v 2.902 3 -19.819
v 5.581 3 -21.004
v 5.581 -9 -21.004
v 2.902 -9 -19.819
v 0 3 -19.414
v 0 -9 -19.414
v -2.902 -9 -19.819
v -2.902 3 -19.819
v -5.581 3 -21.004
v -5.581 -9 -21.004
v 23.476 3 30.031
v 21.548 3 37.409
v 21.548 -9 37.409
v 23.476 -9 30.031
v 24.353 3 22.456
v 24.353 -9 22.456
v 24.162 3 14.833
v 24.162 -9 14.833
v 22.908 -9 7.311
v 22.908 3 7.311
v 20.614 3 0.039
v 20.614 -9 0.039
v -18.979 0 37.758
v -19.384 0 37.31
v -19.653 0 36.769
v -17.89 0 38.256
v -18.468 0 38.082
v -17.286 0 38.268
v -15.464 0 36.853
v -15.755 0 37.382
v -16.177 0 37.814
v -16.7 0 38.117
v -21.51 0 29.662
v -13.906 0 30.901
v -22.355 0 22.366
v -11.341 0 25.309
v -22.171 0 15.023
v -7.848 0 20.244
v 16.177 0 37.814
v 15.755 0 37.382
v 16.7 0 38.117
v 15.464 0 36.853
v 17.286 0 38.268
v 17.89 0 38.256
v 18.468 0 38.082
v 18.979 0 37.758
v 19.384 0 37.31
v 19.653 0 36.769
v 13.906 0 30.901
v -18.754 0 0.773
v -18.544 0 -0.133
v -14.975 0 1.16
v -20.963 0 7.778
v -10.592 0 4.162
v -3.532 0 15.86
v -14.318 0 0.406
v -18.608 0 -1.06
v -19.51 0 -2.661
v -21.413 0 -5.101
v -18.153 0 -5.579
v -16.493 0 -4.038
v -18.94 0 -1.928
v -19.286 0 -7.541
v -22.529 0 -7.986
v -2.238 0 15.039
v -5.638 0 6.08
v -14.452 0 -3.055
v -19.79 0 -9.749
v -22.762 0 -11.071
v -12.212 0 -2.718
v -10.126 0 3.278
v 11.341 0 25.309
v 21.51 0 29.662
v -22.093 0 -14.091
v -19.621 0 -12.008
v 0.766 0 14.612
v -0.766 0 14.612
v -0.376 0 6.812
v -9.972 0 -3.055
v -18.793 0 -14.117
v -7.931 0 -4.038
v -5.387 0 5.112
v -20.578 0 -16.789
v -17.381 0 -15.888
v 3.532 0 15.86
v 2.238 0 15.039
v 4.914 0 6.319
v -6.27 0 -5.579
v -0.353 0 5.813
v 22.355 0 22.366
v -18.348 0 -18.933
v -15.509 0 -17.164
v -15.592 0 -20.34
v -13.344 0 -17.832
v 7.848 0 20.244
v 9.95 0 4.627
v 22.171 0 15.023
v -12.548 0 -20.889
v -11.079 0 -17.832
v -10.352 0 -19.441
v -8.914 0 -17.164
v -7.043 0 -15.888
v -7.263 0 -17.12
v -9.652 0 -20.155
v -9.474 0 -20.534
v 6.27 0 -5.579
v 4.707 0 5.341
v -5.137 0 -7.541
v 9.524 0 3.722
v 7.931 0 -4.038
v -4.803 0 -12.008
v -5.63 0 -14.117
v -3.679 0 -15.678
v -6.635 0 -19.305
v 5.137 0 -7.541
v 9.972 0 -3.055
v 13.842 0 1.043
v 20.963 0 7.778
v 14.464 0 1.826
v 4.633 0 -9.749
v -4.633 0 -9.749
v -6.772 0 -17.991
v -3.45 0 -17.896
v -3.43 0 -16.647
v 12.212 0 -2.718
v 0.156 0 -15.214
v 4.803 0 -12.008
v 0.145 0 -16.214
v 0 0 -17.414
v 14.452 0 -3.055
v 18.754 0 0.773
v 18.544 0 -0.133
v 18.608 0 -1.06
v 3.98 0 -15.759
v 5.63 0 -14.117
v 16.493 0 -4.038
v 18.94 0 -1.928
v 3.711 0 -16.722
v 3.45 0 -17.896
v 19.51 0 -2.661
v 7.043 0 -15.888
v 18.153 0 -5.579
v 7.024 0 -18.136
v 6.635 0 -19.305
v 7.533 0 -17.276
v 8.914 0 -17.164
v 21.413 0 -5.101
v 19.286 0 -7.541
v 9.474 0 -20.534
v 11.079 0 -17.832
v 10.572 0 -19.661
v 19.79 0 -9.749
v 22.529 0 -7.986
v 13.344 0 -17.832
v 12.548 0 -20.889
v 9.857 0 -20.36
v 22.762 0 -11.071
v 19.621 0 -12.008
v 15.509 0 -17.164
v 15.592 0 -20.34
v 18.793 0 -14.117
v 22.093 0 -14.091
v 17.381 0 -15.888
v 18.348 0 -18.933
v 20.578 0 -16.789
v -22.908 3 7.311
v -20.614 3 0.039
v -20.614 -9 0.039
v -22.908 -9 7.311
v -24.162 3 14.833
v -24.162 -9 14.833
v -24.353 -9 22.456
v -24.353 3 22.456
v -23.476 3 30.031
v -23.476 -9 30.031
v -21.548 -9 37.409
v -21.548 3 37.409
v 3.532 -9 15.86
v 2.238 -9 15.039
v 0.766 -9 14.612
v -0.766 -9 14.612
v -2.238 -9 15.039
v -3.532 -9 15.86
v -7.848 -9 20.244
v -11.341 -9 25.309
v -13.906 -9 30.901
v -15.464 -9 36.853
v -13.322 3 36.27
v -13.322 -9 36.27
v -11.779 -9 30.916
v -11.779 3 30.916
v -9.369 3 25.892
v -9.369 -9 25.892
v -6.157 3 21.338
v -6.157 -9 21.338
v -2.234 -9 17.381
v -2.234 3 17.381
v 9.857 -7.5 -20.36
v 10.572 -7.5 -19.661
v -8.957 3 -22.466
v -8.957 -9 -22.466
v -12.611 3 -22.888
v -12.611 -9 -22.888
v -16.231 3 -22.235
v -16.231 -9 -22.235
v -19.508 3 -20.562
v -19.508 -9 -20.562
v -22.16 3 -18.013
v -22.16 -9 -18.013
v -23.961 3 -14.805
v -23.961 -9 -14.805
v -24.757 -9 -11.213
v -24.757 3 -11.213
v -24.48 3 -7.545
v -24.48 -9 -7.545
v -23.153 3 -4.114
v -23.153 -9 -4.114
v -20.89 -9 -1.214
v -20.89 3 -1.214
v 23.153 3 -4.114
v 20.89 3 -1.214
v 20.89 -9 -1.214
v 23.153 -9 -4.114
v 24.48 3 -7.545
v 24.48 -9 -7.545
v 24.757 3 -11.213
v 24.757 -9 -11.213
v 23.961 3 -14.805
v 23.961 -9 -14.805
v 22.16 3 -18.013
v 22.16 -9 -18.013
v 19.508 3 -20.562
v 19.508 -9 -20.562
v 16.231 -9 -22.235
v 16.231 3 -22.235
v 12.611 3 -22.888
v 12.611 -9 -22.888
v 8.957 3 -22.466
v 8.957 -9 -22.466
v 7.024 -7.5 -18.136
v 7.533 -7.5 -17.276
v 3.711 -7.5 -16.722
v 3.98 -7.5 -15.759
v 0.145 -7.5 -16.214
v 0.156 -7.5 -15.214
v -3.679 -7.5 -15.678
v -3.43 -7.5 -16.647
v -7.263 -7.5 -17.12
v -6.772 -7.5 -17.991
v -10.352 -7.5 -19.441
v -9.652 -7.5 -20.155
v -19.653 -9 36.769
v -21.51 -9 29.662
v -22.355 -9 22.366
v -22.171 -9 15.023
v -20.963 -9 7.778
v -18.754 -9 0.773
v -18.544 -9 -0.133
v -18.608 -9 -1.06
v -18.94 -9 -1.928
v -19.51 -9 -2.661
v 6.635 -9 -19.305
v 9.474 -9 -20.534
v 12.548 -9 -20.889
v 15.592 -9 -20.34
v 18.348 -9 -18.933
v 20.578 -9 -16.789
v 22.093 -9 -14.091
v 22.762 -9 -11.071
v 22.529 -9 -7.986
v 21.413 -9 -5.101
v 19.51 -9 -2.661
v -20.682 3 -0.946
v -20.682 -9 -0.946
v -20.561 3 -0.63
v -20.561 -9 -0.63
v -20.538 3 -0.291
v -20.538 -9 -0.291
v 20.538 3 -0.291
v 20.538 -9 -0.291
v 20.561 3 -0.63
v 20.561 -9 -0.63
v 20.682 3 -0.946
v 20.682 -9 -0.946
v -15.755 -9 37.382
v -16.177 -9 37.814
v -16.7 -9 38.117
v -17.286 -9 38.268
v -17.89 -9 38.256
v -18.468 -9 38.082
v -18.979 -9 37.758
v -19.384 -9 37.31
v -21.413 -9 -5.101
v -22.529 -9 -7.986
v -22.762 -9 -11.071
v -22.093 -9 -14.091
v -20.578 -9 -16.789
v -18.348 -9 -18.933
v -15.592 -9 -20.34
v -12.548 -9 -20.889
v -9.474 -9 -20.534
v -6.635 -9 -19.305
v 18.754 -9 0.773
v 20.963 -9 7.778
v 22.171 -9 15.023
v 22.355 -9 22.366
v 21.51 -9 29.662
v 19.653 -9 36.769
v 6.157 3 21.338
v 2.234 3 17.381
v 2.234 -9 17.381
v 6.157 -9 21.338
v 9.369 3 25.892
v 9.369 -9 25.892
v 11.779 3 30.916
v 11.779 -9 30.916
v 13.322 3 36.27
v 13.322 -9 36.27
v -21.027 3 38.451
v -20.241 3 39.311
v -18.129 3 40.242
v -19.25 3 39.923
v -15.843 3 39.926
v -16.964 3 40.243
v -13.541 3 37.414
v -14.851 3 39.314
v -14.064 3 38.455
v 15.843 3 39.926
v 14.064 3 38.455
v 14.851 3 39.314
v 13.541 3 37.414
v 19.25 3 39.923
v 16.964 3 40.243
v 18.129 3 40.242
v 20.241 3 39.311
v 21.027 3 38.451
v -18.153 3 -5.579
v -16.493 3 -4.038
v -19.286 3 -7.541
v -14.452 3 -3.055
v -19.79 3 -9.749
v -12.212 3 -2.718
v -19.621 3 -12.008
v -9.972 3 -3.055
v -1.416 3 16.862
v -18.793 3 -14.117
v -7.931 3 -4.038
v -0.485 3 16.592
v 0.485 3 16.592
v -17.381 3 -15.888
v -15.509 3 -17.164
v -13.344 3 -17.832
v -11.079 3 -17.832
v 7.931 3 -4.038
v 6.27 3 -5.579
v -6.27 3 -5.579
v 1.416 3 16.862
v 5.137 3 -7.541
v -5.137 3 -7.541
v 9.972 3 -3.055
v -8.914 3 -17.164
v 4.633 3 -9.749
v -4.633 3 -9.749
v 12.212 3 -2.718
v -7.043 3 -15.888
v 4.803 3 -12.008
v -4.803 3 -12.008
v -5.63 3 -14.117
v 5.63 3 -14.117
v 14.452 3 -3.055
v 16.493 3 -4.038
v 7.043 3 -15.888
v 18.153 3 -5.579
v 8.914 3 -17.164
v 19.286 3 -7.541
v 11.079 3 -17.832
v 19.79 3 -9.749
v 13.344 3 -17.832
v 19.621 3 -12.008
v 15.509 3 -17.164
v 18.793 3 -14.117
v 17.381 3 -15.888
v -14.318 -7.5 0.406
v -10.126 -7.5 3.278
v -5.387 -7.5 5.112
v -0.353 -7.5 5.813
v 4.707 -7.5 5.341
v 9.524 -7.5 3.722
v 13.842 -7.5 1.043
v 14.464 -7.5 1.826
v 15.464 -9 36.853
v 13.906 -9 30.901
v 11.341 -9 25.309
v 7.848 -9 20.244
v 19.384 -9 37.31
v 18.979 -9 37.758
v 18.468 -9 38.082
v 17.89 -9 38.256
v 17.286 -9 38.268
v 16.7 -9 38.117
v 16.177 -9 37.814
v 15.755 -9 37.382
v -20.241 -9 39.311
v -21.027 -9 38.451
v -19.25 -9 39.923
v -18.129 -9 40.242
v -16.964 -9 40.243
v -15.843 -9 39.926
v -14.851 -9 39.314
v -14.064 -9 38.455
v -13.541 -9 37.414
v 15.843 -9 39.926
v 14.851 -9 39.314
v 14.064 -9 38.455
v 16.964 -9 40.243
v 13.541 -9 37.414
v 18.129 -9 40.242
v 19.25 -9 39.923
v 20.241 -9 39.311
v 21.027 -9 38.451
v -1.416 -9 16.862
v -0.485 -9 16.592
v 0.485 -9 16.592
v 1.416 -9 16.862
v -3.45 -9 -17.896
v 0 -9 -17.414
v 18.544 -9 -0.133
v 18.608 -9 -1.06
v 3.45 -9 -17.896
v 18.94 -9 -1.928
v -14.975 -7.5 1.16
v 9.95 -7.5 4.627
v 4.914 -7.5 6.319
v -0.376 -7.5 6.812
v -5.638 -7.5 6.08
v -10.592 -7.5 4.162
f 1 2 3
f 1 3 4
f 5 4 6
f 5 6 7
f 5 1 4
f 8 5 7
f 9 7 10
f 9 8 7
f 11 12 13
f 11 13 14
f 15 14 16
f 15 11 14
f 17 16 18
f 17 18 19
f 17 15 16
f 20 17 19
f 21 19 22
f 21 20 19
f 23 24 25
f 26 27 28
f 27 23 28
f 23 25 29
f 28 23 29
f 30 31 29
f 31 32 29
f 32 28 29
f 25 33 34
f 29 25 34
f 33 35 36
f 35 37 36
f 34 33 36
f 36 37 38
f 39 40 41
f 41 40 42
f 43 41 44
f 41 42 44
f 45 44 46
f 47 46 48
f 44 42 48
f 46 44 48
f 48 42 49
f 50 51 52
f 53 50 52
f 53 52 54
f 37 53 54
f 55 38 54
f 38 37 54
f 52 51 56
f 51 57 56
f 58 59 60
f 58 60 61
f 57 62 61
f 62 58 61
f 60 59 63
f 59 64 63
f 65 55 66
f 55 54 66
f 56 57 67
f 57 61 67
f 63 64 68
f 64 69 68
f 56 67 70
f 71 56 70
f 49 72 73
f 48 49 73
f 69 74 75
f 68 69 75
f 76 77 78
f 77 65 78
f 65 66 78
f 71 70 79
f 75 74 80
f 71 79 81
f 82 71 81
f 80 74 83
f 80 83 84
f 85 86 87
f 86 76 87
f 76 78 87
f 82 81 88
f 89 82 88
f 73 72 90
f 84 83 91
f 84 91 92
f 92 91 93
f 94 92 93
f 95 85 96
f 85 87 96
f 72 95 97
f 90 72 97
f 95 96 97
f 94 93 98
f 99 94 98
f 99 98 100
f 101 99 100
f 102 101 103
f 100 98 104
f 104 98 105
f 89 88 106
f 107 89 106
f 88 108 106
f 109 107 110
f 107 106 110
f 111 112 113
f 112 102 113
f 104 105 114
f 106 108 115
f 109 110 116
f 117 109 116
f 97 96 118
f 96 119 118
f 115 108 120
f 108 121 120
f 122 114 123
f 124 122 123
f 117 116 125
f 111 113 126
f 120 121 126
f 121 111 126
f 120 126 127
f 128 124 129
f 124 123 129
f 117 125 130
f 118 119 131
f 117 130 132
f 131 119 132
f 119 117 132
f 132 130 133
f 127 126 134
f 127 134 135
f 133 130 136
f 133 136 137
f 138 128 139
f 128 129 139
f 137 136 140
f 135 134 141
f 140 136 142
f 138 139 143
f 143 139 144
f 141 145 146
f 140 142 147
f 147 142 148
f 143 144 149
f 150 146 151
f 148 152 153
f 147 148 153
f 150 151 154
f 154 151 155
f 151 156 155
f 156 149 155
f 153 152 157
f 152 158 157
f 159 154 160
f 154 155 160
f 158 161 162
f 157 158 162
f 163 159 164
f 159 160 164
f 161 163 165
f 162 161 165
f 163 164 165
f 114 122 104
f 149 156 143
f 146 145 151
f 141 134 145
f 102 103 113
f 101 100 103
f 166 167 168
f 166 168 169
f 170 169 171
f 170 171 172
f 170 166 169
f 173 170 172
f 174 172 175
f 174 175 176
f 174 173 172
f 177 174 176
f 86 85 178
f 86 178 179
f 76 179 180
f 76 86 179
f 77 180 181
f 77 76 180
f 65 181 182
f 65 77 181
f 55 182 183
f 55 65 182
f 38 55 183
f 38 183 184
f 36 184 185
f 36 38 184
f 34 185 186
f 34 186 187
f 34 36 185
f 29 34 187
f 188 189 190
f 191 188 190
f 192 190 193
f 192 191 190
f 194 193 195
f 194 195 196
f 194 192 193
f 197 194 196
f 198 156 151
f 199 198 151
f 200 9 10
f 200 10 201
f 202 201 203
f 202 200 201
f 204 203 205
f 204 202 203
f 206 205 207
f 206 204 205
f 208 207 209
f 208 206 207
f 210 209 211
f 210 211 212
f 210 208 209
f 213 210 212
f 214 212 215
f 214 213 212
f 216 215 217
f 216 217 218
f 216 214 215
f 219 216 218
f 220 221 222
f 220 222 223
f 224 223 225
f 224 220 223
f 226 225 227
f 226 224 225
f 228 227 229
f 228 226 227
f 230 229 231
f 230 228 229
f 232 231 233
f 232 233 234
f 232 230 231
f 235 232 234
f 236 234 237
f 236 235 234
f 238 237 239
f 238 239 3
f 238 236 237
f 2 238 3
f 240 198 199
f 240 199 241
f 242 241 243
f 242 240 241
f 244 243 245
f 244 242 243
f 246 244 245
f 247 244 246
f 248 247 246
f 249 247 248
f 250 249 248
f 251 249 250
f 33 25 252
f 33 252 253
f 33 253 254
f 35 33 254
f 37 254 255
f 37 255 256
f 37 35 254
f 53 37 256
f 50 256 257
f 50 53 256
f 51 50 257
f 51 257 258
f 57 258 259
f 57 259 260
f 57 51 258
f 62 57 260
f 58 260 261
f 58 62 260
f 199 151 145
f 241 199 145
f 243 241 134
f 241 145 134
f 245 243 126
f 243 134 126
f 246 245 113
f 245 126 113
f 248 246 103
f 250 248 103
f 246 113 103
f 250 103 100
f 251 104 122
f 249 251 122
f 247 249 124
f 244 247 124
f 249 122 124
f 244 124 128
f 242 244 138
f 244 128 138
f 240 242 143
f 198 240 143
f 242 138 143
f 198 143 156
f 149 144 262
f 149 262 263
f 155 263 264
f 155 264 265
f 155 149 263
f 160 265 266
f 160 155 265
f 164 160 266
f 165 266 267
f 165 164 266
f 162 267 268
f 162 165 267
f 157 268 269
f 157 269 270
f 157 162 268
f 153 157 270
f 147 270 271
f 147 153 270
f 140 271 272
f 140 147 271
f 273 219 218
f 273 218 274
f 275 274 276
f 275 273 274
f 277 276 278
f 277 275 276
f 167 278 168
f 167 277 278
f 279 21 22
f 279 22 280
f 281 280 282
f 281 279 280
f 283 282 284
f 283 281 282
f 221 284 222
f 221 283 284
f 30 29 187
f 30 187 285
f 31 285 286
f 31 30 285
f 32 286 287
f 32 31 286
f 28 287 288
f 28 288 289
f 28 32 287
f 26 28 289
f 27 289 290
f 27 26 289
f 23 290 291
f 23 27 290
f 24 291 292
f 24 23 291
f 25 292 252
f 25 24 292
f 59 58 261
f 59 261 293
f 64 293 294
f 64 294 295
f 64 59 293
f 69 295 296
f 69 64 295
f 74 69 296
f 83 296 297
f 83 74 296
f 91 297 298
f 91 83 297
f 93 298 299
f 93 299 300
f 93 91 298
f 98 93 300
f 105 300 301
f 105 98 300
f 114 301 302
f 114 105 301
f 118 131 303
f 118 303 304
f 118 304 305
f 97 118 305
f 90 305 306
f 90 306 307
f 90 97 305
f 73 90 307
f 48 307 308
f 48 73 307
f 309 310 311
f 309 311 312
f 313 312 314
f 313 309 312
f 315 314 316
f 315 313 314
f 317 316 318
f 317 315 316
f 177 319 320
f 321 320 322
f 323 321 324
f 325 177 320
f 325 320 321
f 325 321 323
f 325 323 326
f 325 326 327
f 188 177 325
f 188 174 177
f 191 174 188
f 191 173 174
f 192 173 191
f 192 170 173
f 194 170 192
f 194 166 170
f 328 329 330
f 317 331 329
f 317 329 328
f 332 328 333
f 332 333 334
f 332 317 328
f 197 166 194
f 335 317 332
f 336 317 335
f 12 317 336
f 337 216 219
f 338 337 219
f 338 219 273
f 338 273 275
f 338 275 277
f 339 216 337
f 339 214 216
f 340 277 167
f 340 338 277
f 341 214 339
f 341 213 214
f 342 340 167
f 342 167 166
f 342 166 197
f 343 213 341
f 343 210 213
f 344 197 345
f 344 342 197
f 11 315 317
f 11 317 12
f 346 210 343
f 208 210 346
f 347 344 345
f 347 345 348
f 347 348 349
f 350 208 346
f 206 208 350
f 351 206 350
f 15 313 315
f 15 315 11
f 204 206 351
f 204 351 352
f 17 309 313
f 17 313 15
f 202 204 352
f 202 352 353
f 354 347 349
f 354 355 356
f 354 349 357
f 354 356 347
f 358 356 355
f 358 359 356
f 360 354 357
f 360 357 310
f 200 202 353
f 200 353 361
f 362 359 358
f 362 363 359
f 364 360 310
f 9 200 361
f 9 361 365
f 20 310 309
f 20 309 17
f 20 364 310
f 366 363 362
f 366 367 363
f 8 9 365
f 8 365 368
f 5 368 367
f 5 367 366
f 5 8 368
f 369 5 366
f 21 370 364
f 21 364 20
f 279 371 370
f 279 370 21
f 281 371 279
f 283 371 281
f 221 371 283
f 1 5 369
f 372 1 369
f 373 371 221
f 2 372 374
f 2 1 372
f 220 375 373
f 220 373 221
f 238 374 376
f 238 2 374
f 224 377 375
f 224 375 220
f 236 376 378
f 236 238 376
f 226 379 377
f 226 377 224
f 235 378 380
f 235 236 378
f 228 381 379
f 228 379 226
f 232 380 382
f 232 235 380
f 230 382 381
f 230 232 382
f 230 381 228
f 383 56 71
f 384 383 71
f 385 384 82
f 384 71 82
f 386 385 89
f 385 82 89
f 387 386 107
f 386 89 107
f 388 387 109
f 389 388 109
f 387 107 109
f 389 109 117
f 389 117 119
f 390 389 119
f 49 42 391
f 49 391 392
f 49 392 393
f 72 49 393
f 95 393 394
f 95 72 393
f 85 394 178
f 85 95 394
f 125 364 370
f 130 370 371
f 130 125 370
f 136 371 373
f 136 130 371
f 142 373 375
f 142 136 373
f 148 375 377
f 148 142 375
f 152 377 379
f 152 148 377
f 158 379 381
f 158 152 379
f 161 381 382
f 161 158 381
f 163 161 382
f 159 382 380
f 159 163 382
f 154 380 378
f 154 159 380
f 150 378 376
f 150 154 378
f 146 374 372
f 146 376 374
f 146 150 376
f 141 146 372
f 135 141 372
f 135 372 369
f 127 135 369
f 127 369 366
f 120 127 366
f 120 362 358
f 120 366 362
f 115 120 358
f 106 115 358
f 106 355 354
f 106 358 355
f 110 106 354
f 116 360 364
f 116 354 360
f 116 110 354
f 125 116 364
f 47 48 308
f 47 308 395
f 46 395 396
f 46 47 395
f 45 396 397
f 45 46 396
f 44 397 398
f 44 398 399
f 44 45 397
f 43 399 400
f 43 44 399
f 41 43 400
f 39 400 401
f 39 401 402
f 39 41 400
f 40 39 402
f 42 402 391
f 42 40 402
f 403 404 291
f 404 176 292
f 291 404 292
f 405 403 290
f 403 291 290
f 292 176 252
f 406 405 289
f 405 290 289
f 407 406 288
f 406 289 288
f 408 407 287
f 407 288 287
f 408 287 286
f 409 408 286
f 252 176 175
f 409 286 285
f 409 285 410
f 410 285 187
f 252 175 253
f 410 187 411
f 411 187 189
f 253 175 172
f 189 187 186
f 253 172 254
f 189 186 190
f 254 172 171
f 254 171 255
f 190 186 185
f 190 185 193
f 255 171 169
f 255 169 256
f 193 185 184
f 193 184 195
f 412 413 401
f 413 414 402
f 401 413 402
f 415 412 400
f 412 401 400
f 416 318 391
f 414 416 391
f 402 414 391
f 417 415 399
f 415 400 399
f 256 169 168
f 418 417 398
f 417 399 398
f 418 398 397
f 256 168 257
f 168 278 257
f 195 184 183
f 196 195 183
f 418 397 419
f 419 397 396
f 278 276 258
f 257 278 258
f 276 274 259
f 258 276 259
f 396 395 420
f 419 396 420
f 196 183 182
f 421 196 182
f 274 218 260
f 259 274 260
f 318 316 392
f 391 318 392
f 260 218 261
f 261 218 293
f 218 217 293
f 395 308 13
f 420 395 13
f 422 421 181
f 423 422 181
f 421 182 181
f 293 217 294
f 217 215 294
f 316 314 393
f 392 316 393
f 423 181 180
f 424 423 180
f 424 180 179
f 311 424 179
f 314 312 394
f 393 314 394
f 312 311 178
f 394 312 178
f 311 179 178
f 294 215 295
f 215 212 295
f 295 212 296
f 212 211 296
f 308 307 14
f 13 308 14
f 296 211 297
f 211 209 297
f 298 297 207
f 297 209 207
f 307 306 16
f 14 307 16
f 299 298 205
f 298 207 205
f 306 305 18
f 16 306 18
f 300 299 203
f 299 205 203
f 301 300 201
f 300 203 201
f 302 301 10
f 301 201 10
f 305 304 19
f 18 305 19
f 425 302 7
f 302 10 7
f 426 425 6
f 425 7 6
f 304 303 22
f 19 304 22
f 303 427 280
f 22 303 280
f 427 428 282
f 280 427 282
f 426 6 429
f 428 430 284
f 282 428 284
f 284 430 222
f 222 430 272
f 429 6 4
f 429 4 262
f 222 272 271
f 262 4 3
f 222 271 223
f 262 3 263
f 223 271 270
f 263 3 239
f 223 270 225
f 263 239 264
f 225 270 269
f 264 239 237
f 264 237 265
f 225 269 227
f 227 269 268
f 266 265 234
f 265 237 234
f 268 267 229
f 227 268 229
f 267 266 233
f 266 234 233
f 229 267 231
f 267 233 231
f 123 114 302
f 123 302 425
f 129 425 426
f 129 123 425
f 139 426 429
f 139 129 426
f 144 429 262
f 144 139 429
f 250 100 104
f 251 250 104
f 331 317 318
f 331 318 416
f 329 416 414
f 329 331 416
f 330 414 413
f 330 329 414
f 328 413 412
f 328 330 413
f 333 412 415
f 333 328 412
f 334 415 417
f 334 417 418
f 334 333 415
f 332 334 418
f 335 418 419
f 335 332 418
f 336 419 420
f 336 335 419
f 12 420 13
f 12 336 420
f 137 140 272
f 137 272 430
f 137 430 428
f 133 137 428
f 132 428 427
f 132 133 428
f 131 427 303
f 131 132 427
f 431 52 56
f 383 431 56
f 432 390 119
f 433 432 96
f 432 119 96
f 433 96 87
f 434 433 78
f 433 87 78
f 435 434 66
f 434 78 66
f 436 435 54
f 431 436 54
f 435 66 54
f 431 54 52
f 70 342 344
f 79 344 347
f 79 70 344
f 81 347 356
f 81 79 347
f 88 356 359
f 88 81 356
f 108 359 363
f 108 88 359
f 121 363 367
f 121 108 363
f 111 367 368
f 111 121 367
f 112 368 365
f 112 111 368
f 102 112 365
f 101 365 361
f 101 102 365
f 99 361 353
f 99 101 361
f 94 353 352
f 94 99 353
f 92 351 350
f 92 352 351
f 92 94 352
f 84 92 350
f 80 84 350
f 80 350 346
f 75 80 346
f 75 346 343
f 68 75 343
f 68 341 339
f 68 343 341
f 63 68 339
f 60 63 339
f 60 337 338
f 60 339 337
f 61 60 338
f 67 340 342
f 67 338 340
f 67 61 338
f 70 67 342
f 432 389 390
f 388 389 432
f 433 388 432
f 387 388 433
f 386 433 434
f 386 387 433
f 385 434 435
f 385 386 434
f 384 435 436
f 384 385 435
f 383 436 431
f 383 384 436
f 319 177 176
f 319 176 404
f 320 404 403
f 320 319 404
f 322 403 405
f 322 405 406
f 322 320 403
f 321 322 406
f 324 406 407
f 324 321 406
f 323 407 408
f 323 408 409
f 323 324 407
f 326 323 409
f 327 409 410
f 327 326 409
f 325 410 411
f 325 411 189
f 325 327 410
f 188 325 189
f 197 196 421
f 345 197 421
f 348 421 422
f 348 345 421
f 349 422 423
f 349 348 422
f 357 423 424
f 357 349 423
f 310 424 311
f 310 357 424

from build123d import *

# Parameters (mm, degrees)
VYSUNOUT_TENKOST_NN_1_DEPTH   = 9
VYSUNOUT_TENKOST_NN_2_DEPTH   = 7.5
VYSUNOUT_TENKOST_NN_2_2_DEPTH = 7.5
P_IDAT_VYSUNUT_M2_DEPTH       = 3
VYSUNOUT_START                = 3
VYSUNOUT_TENKOST_NN_3_DEPTH   = 3
SKICA4_R                      = 7.599478253
ODEBRAT_VYSUNUT_M1_DEPTH      = 10


with BuildPart() as part:
    # Skica3 → Vysunout tenkostěnný1 (new body)
    with BuildSketch(Plane(origin=(0, 0, 0), x_dir=(1, 0, 0), z_dir=(0, 1, 0))):
        with BuildLine():
            ThreePointArc((13.318818193, -36.180678557), (16.919790609, -40.236611382), (21.547993361, -37.408655814))
            ThreePointArc((21.547993361, -37.408655814), (24.391270235, -18.641089057), (20.614348293, -0.038921281))
            ThreePointArc((20.614348293, -0.038921281), (20.561150024, 0.629518412), (20.890277717, 1.213741521))
            ThreePointArc((20.890277717, 1.213741521), (22.159844041, 18.012545588), (5.58094625, 21.004495587))
            ThreePointArc((5.58094625, 21.004495587), (0, 19.413874141), (-5.58094625, 21.004495587))
            ThreePointArc((-5.58094625, 21.004495587), (-22.159844041, 18.012545588), (-20.890277717, 1.213741521))
            ThreePointArc((-20.890277717, 1.213741521), (-20.561150024, 0.629518412), (-20.614348293, -0.038921281))
            ThreePointArc((-20.614348293, -0.038921281), (-24.391270235, -18.641089057), (-21.547993361, -37.408655814))
            ThreePointArc((-21.547993361, -37.408655814), (-16.919790609, -40.236611382), (-13.318818193, -36.180678557))
            Line((-13.318818193, -36.180678557), (-15.317951996, -36.121822462))
            ThreePointArc((-15.317951996, -36.121822462), (-17.214967104, -38.2585136), (-19.653133669, -36.768728669))
            ThreePointArc((-19.653133669, -36.768728669), (-22.391894143, -18.691041449), (-18.753808587, -0.772673285))
            ThreePointArc((-18.753808587, -0.772673285), (-18.607973584, 1.059752989), (-19.510227352, 2.661312241))
            ThreePointArc((-19.510227352, 2.661312241), (-20.577911445, 16.788826149), (-6.635335046, 19.305006173))
            ThreePointArc((-6.635335046, 19.305006173), (0, 17.413874141), (6.635335046, 19.305006173))
            ThreePointArc((6.635335046, 19.305006173), (20.577911445, 16.788826149), (19.510227352, 2.661312241))
            ThreePointArc((19.510227352, 2.661312241), (18.607973584, 1.059752989), (18.753808587, -0.772673285))
            ThreePointArc((18.753808587, -0.772673285), (22.391894143, -18.691041449), (19.653133669, -36.768728669))
            ThreePointArc((19.653133669, -36.768728669), (17.214967104, -38.2585136), (15.317951996, -36.121822462))
            Line((15.317951996, -36.121822462), (13.318818193, -36.180678557))
        make_face()
        with BuildLine():
            ThreePointArc((15.479480606, -36.942506696), (11.363736232, -25.348385806), (3.532419897, -15.859788681))
            ThreePointArc((3.532419897, -15.859788681), (0, -14.557634697), (-3.532419897, -15.859788681))
            ThreePointArc((-3.532419897, -15.859788681), (-11.363736232, -25.348385806), (-15.479480606, -36.942506696))
            Line((-15.479480606, -36.942506696), (-13.507192877, -37.274291437))
            ThreePointArc((-13.507192877, -37.274291437), (-9.623698487, -26.334422643), (-2.234300531, -17.38126366))
            ThreePointArc((-2.234300531, -17.38126366), (0, -16.557634697), (2.234300531, -17.38126366))
            ThreePointArc((2.234300531, -17.38126366), (9.623698487, -26.334422643), (13.507192877, -37.274291437))
            Line((13.507192877, -37.274291437), (15.479480606, -36.942506696))
        make_face()
    extrude(amount=-VYSUNOUT_TENKOST_NN_1_DEPTH)



with BuildPart() as body_2:
    # Skica3<3> → Vysunout tenkostěnný2 (new body)
    with BuildSketch(Plane(origin=(0, 0, 0), x_dir=(1, 0, 0), z_dir=(0, 1, 0))):
        with BuildLine():
            ThreePointArc((-9.651511204, 20.15475088), (0.145367606, 16.213794321), (9.85696713, 20.360456559))
            Line((9.85696713, 20.360456559), (10.571915059, 19.661278857))
            ThreePointArc((10.571915059, 19.661278857), (0.155911444, 15.213849909), (-10.351556954, 19.440652884))
            Line((-10.351556954, 19.440652884), (-9.651511204, 20.15475088))
        make_face()
    extrude(amount=-VYSUNOUT_TENKOST_NN_2_DEPTH)


with BuildPart() as body_3:
    # Skica3<3> → Vysunout tenkost_nn_2 2 (new body)
    with BuildSketch(Plane(origin=(0, 0, 0), x_dir=(1, 0, 0), z_dir=(0, 1, 0))):
        with BuildLine():
            ThreePointArc((-14.318385094, -0.405797283), (-0.353145852, -5.812609189), (13.842408307, -1.043147566))
            Line((13.842408307, -1.043147566), (14.464095548, -1.82641315))
            ThreePointArc((14.464095548, -1.82641315), (-0.375772598, -6.812353171), (-14.974872193, -1.160134535))
            Line((-14.974872193, -1.160134535), (-14.318385094, -0.405797283))
        make_face()
    extrude(amount=-VYSUNOUT_TENKOST_NN_2_2_DEPTH)


with BuildPart() as part_1:
    add(part.part)

    add(body_2.part)  # Přidat vysunutím2 merges body 2

    add(body_3.part)  # Přidat vysunutím2 merges body 3
    # Skica3<4> → Přidat vysunutím2 (add)
    with BuildSketch(Plane(origin=(0, 0, 0), x_dir=(1, 0, 0), z_dir=(0, 1, 0))):
        with BuildLine():
            ThreePointArc((6.108140648, 20.15475088), (0, 18.413874141), (-6.108140648, 20.15475088))
            ThreePointArc((-6.108140648, 20.15475088), (-21.368877743, 17.400685868), (-20.200252534, 1.937526881))
            ThreePointArc((-20.200252534, 1.937526881), (-19.584561804, 0.844635701), (-19.68407844, -0.405797283))
            ThreePointArc((-19.68407844, -0.405797283), (-23.391582189, -18.666065253), (-20.600563515, -37.088692241))
            ThreePointArc((-20.600563515, -37.088692241), (-17.553998549, -39.282880534), (-14.493336742, -37.108399066))
            ThreePointArc((-14.493336742, -37.108399066), (-10.493717359, -25.841404225), (-2.883360214, -16.620526171))
            ThreePointArc((-2.883360214, -16.620526171), (0, -15.557634697), (2.883360214, -16.620526171))
            ThreePointArc((2.883360214, -16.620526171), (10.493717359, -25.841404225), (14.493336742, -37.108399066))
            ThreePointArc((14.493336742, -37.108399066), (17.553998549, -39.282880534), (20.600563515, -37.088692241))
            ThreePointArc((20.600563515, -37.088692241), (23.391582189, -18.666065253), (19.68407844, -0.405797283))
            ThreePointArc((19.68407844, -0.405797283), (19.584561804, 0.844635701), (20.200252534, 1.937526881))
            ThreePointArc((20.200252534, 1.937526881), (21.368877743, 17.400685868), (6.108140648, 20.15475088))
        make_face()
    extrude(amount=P_IDAT_VYSUNUT_M2_DEPTH)

    # Skica3<5> → Vysunout tenkostěnný3 (add)
    with BuildSketch(Plane(origin=(0, 0, 0), x_dir=(1, 0, 0), z_dir=(0, 1, 0)).offset(VYSUNOUT_START)):
        with BuildLine():
            ThreePointArc((13.318818193, -36.180678557), (16.919790609, -40.236611382), (21.547993361, -37.408655814))
            ThreePointArc((21.547993361, -37.408655814), (24.391270235, -18.641089057), (20.614348293, -0.038921281))
            ThreePointArc((20.614348293, -0.038921281), (20.561150024, 0.629518412), (20.890277717, 1.213741521))
            ThreePointArc((20.890277717, 1.213741521), (22.159844041, 18.012545588), (5.58094625, 21.004495587))
            ThreePointArc((5.58094625, 21.004495587), (0, 19.413874141), (-5.58094625, 21.004495587))
            ThreePointArc((-5.58094625, 21.004495587), (-22.159844041, 18.012545588), (-20.890277717, 1.213741521))
            ThreePointArc((-20.890277717, 1.213741521), (-20.561150024, 0.629518412), (-20.614348293, -0.038921281))
            ThreePointArc((-20.614348293, -0.038921281), (-24.391270235, -18.641089057), (-21.547993361, -37.408655814))
            ThreePointArc((-21.547993361, -37.408655814), (-16.919790609, -40.236611382), (-13.318818193, -36.180678557))
            Line((-13.318818193, -36.180678557), (-15.317951996, -36.121822462))
            ThreePointArc((-15.317951996, -36.121822462), (-17.214967104, -38.2585136), (-19.653133669, -36.768728669))
            ThreePointArc((-19.653133669, -36.768728669), (-22.391894143, -18.691041449), (-18.753808587, -0.772673285))
            ThreePointArc((-18.753808587, -0.772673285), (-18.607973584, 1.059752989), (-19.510227352, 2.661312241))
            ThreePointArc((-19.510227352, 2.661312241), (-20.577911445, 16.788826149), (-6.635335046, 19.305006173))
            ThreePointArc((-6.635335046, 19.305006173), (0, 17.413874141), (6.635335046, 19.305006173))
            ThreePointArc((6.635335046, 19.305006173), (20.577911445, 16.788826149), (19.510227352, 2.661312241))
            ThreePointArc((19.510227352, 2.661312241), (18.607973584, 1.059752989), (18.753808587, -0.772673285))
            ThreePointArc((18.753808587, -0.772673285), (22.391894143, -18.691041449), (19.653133669, -36.768728669))
            ThreePointArc((19.653133669, -36.768728669), (17.214967104, -38.2585136), (15.317951996, -36.121822462))
            Line((15.317951996, -36.121822462), (13.318818193, -36.180678557))
        make_face()
        with BuildLine():
            ThreePointArc((15.479480606, -36.942506696), (11.363736232, -25.348385806), (3.532419897, -15.859788681))
            ThreePointArc((3.532419897, -15.859788681), (0, -14.557634697), (-3.532419897, -15.859788681))
            ThreePointArc((-3.532419897, -15.859788681), (-11.363736232, -25.348385806), (-15.479480606, -36.942506696))
            Line((-15.479480606, -36.942506696), (-13.507192877, -37.274291437))
            ThreePointArc((-13.507192877, -37.274291437), (-9.623698487, -26.334422643), (-2.234300531, -17.38126366))
            ThreePointArc((-2.234300531, -17.38126366), (0, -16.557634697), (2.234300531, -17.38126366))
            ThreePointArc((2.234300531, -17.38126366), (9.623698487, -26.334422643), (13.507192877, -37.274291437))
            Line((13.507192877, -37.274291437), (15.479480606, -36.942506696))
        make_face()
        with BuildLine():
            ThreePointArc((-10.351556954, 19.440652884), (0.155911444, 15.213849909), (10.571915059, 19.661278857))
            Line((10.571915059, 19.661278857), (9.1420192, 21.05963426))
            ThreePointArc((9.1420192, 21.05963426), (0.134823768, 17.213738734), (-8.951465454, 20.868848876))
            Line((-8.951465454, 20.868848876), (-10.351556954, 19.440652884))
        make_face()
        with BuildLine():
            ThreePointArc((-14.974872193, -1.160134535), (-0.375772598, -6.812353171), (14.464095548, -1.82641315))
            Line((14.464095548, -1.82641315), (13.220721067, -0.259881982))
            ThreePointArc((13.220721067, -0.259881982), (-0.330519107, -4.812865207), (-13.661897996, 0.348539969))
            Line((-13.661897996, 0.348539969), (-14.974872193, -1.160134535))
        make_face()
    extrude(amount=-VYSUNOUT_TENKOST_NN_3_DEPTH)

    # Skica4 → Odebrat vysunutím1 (cut)
    with BuildSketch(Plane(origin=(0, 0, 0), x_dir=(1, 0, 0), z_dir=(0, 1, 0))):
        with Locations((-12.211626463, 10.317004534)):
            Circle(SKICA4_R)
        with Locations((12.211626463, 10.317004534)):
            Circle(SKICA4_R)
    extrude(amount=ODEBRAT_VYSUNUT_M1_DEPTH, mode=Mode.SUBTRACT)


solid = part_1.part
